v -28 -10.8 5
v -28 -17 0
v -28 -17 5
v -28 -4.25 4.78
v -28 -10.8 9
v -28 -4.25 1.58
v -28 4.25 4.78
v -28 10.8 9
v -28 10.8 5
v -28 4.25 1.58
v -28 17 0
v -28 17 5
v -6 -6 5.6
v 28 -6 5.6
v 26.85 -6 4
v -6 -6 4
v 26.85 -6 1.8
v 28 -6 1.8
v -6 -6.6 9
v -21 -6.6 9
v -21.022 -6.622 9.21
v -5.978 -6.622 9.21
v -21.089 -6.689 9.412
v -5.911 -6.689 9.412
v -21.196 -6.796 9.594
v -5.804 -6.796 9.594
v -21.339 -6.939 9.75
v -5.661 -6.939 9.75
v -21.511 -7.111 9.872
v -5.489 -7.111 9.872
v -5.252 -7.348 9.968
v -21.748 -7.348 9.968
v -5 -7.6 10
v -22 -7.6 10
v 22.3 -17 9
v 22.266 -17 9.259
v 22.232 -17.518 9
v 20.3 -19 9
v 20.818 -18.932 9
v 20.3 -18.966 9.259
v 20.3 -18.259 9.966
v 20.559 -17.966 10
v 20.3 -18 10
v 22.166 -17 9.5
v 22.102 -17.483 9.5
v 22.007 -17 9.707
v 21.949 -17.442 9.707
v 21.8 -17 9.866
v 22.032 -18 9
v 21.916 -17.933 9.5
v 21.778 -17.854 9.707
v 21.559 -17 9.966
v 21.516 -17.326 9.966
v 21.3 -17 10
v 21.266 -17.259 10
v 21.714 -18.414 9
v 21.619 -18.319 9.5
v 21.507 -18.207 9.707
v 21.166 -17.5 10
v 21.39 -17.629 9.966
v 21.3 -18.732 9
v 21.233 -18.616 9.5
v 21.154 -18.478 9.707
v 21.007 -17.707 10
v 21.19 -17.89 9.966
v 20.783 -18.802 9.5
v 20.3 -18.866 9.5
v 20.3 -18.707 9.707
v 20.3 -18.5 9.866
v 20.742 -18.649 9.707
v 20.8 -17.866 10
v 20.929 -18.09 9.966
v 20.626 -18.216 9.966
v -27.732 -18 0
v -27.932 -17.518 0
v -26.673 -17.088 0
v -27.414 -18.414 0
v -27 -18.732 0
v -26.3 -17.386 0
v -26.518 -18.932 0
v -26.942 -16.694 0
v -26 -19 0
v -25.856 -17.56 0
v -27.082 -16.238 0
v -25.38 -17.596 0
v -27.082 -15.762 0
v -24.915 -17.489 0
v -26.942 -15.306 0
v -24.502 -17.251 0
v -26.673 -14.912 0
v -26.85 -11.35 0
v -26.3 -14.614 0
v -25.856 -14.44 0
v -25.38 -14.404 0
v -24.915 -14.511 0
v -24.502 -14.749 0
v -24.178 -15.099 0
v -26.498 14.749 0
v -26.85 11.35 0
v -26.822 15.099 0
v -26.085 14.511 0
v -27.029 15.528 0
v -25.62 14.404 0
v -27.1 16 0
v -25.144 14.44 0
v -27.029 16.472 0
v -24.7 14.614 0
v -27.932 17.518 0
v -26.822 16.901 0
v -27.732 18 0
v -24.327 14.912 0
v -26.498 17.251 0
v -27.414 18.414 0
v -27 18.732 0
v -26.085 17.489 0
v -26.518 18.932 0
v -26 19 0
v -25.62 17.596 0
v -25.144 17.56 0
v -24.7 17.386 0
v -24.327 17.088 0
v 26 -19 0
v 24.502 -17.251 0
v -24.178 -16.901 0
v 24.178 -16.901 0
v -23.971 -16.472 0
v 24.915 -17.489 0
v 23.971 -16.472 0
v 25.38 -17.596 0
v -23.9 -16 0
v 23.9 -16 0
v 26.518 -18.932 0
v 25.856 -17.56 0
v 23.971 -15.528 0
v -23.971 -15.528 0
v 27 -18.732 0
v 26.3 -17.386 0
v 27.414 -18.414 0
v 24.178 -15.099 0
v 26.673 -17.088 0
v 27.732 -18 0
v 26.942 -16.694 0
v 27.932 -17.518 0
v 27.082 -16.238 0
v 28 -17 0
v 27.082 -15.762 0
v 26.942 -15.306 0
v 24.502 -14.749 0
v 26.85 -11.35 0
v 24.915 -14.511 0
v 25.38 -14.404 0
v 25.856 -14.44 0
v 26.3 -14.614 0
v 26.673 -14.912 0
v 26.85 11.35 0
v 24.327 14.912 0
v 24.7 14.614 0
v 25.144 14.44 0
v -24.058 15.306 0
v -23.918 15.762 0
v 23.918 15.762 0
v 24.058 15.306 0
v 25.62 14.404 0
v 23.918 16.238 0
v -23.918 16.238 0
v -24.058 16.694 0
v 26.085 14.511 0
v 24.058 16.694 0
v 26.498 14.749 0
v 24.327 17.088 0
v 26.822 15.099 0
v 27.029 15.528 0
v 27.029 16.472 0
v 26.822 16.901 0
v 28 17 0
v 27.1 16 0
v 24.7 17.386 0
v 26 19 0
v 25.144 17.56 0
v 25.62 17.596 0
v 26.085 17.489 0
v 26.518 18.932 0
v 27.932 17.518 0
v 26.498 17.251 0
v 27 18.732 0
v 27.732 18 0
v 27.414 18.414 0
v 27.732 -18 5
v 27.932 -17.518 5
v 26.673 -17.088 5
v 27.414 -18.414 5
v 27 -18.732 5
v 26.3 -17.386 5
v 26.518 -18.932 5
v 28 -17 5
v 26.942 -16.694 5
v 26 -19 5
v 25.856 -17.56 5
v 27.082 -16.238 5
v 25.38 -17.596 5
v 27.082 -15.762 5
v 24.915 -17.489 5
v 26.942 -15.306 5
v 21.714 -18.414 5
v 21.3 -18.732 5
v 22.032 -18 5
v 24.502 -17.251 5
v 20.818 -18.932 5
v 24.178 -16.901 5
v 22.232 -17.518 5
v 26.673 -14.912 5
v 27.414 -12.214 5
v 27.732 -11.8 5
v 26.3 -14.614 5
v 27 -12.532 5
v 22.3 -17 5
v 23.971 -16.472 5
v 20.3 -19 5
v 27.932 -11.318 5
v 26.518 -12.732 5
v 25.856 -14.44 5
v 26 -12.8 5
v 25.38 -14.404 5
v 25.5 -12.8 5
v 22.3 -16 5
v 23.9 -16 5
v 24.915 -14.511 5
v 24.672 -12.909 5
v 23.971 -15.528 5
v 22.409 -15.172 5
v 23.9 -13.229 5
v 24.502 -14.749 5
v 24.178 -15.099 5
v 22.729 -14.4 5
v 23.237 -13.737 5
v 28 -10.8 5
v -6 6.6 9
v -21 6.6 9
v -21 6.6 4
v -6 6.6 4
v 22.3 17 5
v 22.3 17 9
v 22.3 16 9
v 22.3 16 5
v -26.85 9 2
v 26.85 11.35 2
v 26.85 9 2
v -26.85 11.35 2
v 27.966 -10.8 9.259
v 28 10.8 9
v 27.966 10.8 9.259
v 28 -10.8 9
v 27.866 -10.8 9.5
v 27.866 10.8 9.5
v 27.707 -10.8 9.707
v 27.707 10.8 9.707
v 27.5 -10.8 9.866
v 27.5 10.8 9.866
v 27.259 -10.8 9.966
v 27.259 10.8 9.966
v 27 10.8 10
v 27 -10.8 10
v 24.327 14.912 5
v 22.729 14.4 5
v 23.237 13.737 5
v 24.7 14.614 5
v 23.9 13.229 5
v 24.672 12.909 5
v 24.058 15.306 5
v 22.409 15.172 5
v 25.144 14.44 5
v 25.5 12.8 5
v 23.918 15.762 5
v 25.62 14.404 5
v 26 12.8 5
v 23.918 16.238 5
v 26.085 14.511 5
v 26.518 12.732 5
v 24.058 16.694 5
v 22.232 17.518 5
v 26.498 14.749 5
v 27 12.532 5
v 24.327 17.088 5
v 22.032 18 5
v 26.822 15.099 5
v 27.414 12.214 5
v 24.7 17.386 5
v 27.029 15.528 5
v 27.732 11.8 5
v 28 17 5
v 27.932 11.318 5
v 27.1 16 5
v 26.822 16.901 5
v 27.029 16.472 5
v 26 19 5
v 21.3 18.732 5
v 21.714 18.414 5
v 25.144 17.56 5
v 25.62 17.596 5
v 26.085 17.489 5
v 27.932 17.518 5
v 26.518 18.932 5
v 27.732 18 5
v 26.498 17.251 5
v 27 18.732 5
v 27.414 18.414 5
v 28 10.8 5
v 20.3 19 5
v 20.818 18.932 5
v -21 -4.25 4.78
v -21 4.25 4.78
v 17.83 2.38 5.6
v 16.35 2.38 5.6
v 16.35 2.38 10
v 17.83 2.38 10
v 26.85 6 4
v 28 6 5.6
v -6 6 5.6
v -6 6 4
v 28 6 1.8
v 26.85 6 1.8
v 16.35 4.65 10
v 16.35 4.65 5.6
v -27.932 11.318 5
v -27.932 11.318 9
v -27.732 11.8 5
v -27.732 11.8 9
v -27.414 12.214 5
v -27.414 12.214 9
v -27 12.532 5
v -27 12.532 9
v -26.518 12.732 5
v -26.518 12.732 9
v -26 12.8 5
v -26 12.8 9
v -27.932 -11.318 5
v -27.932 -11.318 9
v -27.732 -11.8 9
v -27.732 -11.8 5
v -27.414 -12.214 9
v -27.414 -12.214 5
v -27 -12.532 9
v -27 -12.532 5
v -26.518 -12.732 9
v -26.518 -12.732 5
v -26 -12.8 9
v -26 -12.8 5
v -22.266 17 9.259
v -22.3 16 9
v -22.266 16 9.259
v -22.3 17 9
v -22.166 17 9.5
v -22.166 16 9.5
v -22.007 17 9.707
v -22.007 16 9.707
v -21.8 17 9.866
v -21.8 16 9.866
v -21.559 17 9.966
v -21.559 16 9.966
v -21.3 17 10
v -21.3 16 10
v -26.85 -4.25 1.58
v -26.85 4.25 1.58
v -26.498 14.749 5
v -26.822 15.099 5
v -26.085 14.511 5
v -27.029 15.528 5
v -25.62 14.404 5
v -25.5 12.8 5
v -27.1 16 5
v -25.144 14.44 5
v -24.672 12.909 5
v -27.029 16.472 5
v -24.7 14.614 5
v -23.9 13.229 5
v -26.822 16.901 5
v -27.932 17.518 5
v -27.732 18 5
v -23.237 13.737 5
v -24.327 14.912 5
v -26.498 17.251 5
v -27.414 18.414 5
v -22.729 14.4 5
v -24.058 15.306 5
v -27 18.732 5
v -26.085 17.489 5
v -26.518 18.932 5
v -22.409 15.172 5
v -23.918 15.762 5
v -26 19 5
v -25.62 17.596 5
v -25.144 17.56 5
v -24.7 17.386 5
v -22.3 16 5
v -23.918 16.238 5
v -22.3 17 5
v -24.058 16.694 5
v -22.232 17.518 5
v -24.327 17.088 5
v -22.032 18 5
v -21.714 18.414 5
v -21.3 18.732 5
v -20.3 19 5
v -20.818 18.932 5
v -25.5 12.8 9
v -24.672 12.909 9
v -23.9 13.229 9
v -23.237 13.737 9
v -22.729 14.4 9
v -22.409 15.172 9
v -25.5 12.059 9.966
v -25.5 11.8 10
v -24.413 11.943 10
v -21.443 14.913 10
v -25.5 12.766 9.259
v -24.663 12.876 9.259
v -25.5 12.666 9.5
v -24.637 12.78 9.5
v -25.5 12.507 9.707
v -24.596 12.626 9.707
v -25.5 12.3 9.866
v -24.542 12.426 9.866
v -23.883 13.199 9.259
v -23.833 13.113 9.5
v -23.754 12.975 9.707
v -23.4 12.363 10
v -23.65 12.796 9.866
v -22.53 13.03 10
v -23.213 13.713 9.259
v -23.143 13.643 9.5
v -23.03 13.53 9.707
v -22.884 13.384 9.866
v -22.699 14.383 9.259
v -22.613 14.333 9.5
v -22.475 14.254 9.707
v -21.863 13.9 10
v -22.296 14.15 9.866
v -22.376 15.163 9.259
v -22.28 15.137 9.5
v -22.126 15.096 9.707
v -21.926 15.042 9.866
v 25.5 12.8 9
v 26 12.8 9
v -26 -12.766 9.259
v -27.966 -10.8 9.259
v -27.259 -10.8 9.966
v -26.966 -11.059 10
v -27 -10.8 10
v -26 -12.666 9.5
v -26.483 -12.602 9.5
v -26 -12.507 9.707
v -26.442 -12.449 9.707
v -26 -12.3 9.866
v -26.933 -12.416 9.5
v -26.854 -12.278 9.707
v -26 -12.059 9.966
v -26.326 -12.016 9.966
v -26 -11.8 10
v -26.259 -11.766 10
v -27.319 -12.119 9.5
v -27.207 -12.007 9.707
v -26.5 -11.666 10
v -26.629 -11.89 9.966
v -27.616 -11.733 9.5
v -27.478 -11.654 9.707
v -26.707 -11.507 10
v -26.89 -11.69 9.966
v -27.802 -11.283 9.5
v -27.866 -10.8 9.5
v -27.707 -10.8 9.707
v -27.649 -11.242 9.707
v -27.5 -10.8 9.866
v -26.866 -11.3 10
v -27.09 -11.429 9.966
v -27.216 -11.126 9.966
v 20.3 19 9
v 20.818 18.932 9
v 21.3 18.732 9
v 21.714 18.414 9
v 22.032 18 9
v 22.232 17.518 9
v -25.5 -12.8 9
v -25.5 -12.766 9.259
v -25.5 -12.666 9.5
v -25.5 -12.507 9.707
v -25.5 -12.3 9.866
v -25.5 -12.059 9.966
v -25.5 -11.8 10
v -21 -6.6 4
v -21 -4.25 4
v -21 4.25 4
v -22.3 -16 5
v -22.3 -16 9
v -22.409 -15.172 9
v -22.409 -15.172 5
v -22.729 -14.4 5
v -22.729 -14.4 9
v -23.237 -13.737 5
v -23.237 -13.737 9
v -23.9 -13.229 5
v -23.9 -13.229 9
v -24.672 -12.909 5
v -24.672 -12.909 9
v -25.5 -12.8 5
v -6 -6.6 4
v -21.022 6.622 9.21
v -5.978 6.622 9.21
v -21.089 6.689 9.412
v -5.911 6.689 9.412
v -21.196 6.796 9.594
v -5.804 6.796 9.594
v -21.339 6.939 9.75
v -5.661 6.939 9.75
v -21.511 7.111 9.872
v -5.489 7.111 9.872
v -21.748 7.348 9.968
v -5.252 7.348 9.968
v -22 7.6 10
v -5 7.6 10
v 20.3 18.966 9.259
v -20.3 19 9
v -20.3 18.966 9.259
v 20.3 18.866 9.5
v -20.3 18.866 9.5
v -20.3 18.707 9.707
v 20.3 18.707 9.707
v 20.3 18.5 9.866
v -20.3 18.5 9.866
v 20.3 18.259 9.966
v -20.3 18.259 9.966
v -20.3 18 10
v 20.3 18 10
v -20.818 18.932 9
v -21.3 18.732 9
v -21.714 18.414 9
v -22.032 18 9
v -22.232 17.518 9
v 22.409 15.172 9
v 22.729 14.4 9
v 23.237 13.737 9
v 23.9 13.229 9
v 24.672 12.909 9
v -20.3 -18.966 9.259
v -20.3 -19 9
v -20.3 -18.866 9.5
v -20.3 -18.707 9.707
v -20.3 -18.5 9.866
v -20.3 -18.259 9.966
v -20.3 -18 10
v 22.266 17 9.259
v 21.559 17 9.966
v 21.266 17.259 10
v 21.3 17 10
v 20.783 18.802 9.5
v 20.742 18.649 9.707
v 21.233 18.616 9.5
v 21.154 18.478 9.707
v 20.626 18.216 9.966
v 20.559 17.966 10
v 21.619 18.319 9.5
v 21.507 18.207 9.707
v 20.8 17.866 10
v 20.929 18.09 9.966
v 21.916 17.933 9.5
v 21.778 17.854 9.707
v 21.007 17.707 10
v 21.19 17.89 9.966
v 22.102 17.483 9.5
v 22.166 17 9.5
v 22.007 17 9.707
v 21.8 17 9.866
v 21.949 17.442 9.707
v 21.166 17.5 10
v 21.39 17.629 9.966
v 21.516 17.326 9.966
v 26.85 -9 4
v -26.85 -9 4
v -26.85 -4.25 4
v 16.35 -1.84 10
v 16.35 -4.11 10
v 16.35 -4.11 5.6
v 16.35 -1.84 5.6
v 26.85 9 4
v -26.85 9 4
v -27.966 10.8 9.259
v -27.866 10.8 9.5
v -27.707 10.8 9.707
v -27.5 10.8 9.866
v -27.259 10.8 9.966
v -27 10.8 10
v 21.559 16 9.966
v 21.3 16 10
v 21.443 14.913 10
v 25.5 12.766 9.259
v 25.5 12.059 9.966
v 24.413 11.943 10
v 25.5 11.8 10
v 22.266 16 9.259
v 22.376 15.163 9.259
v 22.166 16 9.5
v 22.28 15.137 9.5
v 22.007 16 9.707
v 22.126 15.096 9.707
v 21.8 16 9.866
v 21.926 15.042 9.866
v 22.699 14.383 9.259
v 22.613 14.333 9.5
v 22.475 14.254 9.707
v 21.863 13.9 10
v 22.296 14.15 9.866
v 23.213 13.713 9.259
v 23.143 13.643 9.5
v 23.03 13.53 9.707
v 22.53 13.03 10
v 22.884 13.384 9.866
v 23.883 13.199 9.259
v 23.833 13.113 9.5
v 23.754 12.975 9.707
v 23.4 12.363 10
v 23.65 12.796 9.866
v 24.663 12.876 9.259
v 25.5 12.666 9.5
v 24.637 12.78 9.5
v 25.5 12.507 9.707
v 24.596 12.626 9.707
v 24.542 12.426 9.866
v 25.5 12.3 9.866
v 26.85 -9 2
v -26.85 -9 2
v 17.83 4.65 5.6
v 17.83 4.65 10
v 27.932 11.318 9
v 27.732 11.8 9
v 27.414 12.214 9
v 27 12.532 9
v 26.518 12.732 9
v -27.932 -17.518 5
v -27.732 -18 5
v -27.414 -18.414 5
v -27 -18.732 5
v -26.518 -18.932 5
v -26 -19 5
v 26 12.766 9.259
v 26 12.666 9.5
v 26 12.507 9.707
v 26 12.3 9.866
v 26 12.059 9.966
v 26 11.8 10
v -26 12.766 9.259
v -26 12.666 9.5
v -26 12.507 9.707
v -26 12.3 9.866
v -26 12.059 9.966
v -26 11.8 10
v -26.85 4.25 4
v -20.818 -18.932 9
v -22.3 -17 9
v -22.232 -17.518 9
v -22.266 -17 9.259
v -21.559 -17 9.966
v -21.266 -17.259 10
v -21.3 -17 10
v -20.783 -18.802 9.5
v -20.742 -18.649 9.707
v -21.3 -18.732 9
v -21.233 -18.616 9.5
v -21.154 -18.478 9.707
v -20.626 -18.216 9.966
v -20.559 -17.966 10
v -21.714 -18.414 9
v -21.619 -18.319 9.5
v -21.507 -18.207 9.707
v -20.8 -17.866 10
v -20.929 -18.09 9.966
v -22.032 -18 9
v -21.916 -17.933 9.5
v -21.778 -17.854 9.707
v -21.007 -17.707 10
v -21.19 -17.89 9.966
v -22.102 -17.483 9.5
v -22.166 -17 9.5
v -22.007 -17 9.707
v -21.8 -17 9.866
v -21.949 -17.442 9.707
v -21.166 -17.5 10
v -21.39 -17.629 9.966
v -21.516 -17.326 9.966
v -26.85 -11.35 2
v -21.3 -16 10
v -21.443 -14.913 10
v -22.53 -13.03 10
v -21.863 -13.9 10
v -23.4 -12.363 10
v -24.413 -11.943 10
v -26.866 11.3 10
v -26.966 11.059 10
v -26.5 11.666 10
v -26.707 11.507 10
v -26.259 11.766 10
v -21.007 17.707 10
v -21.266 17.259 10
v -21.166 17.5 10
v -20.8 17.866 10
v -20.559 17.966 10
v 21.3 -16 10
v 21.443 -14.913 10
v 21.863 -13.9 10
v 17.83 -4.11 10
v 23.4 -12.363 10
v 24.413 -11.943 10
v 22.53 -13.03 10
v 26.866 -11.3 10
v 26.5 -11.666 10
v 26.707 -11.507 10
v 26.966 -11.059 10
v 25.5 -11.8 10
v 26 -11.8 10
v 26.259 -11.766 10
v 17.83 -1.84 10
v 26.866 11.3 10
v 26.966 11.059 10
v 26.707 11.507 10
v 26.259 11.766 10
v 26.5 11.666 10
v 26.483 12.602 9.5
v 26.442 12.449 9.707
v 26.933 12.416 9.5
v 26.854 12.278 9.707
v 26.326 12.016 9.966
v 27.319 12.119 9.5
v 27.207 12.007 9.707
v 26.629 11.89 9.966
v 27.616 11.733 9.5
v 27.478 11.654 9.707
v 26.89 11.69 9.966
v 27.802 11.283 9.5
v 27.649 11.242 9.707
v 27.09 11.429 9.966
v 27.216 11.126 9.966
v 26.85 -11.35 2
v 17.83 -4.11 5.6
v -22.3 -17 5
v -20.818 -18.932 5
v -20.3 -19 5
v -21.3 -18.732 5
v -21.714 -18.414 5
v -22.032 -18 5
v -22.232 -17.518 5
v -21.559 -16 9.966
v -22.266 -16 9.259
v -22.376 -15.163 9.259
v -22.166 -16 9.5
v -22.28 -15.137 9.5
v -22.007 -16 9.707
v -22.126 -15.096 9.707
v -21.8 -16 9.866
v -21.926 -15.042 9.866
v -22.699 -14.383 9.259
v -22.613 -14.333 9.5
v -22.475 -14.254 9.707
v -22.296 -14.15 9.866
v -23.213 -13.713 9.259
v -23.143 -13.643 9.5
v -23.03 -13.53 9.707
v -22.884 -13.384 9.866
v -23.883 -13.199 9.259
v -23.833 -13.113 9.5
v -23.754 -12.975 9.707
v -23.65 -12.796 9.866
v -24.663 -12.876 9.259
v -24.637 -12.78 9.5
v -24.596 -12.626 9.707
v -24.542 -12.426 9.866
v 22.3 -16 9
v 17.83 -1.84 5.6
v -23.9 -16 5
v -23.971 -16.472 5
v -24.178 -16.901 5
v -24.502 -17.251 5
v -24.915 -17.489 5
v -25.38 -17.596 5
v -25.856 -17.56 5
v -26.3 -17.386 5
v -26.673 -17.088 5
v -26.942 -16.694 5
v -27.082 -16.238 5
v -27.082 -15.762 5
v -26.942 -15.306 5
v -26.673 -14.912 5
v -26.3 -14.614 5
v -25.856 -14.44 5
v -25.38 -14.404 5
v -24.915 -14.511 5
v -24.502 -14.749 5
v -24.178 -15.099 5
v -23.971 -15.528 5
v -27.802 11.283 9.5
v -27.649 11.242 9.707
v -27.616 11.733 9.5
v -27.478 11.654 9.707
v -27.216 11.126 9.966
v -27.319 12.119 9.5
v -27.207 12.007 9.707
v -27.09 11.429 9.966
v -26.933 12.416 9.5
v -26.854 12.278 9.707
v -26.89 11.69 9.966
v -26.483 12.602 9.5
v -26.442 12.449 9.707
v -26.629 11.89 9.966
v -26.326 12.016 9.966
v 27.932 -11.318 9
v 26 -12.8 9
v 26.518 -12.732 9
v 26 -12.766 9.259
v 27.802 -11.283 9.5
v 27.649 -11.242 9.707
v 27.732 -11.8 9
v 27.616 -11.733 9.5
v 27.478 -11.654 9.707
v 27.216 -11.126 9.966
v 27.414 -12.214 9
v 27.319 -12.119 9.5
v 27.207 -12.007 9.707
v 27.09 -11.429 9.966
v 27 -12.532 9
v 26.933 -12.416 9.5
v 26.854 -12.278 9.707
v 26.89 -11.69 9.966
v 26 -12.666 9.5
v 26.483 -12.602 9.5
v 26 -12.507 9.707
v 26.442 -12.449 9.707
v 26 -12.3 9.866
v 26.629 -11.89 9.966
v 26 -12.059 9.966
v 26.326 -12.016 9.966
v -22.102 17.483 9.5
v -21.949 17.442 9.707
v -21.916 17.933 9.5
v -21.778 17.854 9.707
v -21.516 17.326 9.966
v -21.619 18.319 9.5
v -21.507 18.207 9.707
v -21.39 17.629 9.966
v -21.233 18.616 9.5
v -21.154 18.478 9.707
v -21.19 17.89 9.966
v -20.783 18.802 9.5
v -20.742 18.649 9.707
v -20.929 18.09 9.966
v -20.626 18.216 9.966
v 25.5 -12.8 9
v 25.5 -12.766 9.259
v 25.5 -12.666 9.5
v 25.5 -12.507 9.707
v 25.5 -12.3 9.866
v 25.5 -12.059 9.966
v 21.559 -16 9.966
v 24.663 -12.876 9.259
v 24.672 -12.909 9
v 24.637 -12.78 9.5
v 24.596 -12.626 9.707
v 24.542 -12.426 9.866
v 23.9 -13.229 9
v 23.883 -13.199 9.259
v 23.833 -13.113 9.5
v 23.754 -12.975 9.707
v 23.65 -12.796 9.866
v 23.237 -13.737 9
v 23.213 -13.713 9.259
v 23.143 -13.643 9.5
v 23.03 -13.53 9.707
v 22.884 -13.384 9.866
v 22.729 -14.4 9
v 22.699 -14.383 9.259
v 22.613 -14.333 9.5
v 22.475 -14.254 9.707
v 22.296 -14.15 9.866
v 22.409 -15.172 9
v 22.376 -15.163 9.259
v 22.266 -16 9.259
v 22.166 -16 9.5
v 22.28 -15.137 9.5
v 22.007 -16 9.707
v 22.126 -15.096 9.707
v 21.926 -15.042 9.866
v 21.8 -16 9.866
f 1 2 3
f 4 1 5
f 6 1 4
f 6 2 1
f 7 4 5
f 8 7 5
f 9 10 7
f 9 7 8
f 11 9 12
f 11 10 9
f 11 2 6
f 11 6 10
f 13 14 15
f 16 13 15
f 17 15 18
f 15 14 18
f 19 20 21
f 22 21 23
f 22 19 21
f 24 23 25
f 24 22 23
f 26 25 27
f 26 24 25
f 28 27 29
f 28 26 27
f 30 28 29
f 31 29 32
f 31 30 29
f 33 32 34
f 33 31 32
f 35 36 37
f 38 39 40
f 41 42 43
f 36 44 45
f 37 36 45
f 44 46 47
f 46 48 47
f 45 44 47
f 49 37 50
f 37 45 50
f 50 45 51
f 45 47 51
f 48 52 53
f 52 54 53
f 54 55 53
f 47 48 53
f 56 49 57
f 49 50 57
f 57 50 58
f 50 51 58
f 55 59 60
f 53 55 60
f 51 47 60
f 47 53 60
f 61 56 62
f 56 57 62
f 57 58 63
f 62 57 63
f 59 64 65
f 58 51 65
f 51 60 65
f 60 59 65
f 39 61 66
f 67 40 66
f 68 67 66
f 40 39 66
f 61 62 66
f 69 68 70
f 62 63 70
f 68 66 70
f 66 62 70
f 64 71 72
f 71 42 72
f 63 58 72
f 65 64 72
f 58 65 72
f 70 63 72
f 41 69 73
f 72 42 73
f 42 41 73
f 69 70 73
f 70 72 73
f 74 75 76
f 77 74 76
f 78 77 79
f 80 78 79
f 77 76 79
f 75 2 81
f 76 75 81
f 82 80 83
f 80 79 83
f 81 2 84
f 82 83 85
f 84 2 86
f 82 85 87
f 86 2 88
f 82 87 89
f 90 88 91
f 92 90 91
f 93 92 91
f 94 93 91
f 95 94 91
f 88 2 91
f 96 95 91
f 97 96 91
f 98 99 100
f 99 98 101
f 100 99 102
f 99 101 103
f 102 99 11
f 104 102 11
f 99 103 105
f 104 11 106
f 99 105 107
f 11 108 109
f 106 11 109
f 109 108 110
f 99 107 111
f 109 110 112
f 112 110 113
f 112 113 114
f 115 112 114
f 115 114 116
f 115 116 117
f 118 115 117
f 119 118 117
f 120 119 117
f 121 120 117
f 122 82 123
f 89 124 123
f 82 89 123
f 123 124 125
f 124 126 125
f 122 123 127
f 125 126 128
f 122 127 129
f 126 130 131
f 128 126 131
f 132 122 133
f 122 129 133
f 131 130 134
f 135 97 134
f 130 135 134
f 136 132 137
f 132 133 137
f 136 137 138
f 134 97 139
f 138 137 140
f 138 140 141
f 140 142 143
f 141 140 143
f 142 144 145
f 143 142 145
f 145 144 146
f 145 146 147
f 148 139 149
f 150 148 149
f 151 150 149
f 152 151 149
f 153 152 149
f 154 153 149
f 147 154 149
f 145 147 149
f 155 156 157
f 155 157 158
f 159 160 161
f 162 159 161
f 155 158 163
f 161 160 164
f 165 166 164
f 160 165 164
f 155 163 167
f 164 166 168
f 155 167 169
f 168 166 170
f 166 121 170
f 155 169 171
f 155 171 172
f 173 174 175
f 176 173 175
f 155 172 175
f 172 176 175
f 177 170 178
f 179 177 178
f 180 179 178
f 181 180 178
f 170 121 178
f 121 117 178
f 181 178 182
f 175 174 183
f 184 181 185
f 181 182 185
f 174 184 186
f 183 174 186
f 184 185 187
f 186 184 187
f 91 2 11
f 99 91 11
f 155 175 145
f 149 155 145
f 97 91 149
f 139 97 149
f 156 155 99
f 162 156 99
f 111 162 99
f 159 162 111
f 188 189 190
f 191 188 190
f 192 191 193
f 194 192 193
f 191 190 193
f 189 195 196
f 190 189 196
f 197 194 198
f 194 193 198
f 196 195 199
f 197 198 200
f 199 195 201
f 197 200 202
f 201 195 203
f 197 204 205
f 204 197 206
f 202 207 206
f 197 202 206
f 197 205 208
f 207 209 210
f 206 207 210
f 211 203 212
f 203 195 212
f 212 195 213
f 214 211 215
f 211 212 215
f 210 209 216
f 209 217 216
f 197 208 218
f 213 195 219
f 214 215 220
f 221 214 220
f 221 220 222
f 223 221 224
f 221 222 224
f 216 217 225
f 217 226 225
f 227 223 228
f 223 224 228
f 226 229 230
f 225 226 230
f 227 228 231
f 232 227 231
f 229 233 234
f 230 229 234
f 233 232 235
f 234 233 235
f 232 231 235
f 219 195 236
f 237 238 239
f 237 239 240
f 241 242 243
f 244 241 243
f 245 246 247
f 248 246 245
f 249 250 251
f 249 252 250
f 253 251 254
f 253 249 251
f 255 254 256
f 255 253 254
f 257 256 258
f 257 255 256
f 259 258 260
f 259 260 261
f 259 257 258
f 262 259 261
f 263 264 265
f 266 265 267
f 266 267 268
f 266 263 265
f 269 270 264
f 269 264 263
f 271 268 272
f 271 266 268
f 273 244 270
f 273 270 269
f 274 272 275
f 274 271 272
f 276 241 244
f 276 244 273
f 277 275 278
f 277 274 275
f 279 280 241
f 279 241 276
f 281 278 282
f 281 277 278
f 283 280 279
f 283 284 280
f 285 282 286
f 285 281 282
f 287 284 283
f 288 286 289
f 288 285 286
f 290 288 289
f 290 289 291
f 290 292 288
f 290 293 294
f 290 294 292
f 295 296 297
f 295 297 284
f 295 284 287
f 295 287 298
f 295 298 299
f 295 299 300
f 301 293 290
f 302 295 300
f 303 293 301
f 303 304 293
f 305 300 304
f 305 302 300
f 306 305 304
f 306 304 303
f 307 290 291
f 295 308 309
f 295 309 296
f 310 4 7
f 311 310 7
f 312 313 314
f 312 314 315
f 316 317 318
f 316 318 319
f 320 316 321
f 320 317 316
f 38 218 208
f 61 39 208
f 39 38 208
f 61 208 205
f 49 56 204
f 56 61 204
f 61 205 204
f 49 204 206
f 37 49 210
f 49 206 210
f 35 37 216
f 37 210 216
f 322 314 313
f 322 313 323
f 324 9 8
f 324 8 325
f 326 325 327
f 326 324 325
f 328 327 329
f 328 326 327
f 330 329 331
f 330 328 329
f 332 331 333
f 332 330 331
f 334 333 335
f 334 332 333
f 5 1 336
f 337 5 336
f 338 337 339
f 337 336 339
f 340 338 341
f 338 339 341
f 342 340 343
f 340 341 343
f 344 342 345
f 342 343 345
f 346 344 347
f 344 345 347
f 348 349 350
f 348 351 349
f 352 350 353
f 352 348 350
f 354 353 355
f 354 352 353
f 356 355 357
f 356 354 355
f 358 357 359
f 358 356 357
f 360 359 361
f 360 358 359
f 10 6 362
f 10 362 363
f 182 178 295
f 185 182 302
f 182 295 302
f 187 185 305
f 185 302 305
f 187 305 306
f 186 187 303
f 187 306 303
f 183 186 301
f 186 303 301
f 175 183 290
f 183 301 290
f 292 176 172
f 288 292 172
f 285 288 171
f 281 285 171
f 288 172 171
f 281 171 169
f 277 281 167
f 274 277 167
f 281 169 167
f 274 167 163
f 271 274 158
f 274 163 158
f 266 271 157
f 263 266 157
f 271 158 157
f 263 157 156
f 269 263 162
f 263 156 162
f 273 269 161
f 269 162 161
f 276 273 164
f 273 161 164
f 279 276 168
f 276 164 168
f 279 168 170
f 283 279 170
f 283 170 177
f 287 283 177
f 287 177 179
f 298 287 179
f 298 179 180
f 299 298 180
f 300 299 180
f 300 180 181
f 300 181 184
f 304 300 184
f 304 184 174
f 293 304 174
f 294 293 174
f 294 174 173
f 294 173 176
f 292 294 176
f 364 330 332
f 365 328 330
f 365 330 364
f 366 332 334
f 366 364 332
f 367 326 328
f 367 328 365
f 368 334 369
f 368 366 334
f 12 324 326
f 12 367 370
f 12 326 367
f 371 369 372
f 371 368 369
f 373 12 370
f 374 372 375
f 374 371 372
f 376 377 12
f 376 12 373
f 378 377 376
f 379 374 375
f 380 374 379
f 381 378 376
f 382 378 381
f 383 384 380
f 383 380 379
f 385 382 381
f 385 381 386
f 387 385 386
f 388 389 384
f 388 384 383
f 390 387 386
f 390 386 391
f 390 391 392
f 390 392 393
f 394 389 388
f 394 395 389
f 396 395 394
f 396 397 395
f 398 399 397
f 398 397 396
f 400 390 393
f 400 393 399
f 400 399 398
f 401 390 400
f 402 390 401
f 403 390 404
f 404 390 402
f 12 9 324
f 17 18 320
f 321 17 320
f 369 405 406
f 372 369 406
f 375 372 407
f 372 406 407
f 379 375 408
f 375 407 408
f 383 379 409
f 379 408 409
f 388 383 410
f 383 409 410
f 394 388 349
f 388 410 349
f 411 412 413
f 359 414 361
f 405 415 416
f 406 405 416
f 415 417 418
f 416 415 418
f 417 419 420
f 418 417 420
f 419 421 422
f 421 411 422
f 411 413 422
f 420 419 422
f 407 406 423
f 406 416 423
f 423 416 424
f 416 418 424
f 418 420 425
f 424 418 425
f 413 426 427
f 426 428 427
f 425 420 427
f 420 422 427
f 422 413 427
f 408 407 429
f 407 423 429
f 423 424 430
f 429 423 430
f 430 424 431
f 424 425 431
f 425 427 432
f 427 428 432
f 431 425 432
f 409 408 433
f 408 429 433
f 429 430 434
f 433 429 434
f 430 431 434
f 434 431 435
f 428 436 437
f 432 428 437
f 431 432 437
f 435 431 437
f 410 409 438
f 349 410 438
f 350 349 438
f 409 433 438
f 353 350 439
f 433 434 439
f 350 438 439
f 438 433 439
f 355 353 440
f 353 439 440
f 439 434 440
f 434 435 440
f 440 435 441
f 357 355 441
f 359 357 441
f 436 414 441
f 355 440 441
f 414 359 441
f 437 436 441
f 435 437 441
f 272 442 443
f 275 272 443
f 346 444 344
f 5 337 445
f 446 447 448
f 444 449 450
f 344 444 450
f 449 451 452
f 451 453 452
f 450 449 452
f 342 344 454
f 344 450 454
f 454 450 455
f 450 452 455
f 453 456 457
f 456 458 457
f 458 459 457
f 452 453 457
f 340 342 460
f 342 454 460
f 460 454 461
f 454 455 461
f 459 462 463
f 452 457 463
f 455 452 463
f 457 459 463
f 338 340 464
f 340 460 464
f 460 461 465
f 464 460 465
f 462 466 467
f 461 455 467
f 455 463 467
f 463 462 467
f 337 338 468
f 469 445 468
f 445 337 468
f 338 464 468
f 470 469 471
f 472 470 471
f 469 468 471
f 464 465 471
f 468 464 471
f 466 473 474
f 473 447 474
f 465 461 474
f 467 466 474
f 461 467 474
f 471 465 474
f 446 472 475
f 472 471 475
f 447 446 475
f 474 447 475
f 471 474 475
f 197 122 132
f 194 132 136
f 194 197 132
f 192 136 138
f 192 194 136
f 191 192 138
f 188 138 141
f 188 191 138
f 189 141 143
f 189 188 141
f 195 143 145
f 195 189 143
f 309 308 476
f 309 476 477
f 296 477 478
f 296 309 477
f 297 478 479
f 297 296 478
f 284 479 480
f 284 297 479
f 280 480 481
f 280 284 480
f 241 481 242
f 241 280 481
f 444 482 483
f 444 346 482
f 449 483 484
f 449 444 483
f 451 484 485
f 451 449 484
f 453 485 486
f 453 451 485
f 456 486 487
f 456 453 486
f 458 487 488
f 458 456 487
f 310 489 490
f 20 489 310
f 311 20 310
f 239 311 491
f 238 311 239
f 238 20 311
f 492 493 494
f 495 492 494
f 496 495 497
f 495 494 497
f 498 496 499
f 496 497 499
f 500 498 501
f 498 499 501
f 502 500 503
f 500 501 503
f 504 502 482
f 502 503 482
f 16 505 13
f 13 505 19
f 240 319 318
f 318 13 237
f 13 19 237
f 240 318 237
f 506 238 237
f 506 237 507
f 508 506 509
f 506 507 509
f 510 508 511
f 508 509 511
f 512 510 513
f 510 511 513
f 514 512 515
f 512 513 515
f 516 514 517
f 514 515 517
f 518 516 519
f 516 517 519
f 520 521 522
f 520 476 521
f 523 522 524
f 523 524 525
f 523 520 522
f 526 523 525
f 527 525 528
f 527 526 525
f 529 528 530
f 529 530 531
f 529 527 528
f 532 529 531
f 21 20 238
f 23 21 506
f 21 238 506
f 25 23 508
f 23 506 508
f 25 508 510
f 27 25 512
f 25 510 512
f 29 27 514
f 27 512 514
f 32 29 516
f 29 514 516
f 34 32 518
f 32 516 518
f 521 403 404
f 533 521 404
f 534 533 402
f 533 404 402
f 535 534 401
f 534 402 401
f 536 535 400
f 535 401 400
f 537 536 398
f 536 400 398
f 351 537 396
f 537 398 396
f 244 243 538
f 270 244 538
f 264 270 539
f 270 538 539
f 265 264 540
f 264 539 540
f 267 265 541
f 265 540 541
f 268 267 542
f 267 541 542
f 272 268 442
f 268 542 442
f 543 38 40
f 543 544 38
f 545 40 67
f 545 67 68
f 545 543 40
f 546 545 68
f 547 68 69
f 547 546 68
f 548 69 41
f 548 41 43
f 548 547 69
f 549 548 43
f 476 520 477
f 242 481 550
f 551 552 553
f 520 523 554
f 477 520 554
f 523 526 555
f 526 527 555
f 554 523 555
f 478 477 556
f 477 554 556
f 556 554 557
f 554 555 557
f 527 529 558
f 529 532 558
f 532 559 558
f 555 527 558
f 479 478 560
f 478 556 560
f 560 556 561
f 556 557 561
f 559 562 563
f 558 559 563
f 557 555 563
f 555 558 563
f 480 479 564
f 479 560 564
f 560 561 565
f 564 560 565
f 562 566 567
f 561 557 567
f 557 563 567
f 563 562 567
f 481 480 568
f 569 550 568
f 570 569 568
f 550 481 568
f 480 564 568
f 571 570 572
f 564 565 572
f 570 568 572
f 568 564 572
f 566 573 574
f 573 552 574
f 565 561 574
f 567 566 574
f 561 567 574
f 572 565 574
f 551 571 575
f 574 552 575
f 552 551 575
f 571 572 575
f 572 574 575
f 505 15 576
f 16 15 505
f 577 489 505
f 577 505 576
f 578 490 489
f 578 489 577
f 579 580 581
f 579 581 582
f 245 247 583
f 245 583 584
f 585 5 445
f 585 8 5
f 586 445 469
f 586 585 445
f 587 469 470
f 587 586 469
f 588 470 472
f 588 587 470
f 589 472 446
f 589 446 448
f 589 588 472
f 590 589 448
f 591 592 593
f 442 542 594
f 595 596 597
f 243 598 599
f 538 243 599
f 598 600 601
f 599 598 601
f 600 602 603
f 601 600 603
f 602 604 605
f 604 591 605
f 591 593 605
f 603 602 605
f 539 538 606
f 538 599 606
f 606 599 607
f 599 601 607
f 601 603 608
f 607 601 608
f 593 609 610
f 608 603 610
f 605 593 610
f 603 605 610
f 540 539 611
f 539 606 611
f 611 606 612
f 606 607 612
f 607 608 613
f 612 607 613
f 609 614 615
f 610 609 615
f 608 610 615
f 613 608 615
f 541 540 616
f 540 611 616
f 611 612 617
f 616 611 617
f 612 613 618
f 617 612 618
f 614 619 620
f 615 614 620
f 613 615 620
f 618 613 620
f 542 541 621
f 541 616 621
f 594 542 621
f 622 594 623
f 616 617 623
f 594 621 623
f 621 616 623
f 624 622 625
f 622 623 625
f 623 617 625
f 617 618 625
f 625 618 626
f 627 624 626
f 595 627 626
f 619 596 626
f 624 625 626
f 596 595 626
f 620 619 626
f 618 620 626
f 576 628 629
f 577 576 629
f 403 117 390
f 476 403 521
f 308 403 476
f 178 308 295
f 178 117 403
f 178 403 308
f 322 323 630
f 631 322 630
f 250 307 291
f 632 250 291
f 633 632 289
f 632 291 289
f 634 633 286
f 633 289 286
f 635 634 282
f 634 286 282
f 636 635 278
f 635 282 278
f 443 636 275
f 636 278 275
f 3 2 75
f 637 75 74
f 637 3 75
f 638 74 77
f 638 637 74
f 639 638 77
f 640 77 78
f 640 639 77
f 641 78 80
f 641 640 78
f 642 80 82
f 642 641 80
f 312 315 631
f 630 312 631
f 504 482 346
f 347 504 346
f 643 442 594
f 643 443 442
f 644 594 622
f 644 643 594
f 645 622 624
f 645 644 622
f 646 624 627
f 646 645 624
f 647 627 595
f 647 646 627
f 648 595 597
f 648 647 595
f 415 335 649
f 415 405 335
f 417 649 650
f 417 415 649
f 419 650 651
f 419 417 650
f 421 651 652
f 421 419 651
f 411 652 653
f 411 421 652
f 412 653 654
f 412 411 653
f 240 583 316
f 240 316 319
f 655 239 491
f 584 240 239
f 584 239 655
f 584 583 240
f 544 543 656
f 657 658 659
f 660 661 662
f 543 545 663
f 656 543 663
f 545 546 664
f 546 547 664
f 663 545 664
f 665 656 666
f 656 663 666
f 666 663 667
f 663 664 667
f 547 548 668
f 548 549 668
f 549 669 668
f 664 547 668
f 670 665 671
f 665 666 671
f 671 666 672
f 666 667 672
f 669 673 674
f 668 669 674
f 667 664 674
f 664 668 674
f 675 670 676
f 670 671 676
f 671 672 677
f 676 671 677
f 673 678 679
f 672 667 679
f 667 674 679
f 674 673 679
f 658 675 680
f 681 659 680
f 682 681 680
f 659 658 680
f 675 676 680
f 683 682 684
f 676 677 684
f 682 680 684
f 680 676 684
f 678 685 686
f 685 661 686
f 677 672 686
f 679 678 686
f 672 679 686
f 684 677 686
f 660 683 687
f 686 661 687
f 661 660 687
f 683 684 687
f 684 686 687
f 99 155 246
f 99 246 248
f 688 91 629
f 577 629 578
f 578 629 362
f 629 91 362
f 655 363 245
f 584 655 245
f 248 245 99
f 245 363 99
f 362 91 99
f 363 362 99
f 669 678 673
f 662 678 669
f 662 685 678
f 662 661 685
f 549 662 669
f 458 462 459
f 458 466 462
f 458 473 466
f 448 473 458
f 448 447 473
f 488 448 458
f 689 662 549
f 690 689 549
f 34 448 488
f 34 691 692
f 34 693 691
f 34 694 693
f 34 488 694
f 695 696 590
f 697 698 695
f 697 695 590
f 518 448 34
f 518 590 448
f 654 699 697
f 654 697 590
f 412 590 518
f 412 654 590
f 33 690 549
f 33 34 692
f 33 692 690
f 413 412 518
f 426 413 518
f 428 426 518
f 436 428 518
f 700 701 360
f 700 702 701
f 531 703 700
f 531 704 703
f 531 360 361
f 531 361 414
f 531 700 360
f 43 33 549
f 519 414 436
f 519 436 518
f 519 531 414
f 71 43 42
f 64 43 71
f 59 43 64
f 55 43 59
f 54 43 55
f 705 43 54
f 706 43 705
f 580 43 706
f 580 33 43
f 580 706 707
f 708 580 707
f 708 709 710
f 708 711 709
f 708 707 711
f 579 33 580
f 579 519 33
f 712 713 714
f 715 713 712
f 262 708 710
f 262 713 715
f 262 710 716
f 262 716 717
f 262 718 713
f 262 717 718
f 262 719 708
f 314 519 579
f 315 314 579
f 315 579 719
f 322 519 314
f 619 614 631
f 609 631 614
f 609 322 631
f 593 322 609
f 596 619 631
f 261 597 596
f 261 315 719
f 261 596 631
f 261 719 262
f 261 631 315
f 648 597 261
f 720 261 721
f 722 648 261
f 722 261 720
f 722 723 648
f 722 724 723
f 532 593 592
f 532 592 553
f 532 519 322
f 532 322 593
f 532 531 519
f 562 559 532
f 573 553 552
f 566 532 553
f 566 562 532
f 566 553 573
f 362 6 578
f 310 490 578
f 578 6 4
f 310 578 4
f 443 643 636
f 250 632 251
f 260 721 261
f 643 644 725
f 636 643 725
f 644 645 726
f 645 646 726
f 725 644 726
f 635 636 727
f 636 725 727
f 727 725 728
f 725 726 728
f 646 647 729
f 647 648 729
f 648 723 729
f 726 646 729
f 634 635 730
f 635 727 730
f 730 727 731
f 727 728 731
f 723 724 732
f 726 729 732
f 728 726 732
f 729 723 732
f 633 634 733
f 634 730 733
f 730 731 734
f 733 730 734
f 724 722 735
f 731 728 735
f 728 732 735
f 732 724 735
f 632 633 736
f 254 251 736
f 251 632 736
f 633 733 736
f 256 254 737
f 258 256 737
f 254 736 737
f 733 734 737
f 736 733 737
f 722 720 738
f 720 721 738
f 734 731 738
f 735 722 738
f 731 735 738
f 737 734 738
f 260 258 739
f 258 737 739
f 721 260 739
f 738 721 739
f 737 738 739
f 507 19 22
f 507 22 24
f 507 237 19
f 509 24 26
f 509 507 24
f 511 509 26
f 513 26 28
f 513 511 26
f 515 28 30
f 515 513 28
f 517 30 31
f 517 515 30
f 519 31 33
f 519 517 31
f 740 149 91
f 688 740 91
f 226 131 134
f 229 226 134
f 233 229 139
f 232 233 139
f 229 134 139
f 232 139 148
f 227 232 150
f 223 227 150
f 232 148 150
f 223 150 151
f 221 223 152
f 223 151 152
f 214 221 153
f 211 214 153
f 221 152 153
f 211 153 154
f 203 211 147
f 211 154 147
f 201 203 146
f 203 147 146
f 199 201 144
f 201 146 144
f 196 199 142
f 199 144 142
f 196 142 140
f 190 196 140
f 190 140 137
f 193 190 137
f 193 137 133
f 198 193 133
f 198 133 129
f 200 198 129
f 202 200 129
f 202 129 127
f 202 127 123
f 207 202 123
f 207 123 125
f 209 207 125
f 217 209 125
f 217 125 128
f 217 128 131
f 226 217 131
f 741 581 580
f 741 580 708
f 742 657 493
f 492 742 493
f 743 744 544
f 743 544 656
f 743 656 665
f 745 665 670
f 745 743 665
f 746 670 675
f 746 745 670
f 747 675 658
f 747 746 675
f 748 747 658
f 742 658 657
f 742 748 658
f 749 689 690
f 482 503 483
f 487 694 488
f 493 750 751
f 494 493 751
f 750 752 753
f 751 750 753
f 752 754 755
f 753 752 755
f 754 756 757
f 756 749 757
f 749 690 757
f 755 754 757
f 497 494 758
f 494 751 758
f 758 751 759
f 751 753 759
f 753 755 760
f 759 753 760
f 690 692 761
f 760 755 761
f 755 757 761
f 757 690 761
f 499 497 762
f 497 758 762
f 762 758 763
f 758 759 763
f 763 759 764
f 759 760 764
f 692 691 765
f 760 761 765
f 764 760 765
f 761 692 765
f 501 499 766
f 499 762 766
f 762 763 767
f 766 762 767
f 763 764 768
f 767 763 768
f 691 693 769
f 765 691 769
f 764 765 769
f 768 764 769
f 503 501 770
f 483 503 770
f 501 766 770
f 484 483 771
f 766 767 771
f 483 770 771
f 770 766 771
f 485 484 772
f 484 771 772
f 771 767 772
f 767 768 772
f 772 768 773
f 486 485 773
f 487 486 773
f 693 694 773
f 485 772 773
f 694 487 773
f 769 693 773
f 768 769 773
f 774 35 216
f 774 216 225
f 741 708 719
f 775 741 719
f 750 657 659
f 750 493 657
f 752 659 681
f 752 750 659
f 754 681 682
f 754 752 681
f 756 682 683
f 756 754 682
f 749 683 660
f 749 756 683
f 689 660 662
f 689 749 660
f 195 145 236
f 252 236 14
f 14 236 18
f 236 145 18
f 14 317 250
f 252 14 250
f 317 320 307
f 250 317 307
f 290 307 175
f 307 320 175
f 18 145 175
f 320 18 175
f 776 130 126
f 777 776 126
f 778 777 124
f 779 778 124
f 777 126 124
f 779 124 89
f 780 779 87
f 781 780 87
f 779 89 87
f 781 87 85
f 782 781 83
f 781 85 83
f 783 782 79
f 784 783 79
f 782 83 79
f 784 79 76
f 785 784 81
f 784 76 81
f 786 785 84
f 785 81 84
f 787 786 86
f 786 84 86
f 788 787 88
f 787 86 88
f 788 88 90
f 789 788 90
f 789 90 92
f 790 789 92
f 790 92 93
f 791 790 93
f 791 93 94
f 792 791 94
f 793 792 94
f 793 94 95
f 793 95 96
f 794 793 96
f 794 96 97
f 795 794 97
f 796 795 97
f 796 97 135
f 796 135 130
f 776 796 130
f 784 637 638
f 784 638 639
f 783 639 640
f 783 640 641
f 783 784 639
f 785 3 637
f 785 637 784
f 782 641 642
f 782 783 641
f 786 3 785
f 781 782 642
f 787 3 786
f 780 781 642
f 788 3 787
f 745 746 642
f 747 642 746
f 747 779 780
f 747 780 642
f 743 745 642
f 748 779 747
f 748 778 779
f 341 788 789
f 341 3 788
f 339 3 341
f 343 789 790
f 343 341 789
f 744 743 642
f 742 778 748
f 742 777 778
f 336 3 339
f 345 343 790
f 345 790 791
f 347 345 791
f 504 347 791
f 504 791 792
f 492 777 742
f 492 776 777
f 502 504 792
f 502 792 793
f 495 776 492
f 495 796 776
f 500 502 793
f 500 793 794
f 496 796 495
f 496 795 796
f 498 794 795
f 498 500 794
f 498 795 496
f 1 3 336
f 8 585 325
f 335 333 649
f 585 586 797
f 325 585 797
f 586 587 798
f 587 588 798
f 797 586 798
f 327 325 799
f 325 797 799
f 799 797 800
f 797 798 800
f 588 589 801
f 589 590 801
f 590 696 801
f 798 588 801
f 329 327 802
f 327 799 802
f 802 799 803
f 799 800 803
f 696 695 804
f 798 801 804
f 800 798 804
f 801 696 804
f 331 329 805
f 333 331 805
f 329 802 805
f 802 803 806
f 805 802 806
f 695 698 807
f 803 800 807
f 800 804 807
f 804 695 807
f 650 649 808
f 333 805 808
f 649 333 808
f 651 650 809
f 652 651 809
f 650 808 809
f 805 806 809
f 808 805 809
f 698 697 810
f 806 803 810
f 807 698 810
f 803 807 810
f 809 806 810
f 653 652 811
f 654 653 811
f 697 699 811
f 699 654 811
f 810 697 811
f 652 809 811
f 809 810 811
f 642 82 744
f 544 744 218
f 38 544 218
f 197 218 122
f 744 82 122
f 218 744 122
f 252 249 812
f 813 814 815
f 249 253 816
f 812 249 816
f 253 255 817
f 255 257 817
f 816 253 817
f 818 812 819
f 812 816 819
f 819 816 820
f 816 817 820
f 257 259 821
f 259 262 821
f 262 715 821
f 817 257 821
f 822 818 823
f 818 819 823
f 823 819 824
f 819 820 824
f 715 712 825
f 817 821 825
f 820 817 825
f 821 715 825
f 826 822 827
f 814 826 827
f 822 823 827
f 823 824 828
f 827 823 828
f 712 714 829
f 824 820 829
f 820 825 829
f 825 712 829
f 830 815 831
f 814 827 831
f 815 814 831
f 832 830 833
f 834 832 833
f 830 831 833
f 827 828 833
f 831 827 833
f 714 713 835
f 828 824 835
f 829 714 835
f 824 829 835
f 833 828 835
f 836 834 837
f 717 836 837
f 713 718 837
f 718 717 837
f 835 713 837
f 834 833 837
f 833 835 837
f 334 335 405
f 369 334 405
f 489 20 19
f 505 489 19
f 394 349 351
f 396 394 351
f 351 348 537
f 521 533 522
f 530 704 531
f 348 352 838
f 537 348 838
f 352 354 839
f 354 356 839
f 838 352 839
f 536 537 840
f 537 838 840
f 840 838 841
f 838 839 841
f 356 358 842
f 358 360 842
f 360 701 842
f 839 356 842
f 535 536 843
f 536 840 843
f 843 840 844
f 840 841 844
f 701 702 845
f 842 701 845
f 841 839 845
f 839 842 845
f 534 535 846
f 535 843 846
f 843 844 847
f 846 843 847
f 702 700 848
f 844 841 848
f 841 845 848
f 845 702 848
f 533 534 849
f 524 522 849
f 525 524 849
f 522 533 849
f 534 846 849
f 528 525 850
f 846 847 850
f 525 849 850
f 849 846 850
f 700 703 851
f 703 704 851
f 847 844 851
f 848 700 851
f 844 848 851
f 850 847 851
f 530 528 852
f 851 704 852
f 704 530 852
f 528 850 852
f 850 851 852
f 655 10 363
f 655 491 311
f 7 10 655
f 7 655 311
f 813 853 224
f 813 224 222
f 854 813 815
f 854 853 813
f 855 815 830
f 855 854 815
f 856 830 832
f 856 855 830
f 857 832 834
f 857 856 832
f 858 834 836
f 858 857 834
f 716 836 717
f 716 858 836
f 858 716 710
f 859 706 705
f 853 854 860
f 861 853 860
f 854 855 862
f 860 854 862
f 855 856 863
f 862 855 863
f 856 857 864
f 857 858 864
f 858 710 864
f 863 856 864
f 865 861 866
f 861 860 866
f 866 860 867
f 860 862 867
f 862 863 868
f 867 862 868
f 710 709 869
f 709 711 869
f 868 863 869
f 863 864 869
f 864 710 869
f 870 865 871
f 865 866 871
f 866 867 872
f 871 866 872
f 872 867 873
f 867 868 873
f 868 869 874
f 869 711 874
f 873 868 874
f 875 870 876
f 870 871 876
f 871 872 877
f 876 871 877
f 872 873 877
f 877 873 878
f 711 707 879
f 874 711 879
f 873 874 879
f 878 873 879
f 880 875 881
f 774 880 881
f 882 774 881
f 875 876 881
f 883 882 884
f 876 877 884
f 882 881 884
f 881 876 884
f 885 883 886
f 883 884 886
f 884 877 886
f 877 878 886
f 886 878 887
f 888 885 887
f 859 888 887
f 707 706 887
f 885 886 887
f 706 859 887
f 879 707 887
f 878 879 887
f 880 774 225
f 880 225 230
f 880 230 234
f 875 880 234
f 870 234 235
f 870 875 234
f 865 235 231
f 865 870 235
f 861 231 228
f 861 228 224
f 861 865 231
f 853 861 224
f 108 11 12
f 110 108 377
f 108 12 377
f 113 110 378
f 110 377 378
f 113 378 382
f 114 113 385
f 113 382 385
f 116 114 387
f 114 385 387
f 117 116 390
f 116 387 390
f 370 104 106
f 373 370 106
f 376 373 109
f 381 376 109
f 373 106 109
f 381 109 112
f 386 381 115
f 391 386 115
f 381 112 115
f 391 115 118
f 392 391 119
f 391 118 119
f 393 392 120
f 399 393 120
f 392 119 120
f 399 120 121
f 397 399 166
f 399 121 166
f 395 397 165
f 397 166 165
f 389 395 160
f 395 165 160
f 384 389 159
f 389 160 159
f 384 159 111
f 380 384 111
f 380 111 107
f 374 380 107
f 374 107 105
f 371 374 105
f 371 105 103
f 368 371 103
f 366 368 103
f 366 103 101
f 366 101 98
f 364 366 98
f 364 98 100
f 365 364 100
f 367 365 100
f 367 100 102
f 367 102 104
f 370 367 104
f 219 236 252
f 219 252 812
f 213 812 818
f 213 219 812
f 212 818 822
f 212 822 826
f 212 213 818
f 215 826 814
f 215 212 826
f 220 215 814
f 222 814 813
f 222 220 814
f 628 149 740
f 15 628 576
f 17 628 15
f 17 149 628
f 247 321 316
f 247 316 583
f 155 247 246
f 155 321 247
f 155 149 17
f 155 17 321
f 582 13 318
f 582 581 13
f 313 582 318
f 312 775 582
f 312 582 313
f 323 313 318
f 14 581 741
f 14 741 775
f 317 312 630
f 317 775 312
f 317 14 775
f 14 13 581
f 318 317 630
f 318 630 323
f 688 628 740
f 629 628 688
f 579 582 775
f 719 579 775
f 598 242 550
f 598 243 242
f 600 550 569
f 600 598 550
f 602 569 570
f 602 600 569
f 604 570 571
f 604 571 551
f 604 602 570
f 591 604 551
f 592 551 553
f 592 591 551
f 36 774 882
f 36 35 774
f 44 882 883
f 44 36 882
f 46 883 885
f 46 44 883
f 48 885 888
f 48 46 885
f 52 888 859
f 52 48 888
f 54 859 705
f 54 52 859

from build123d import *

# Parameters (mm, degrees)
SKETCH_1_W          = 56
SKETCH_1_H          = 38
EXTRUDE_1_DEPTH     = 10
SKETCH_2_W          = 15
SKETCH_2_H          = 13.2
SKETCH_2_W_2        = 1.48
SKETCH_2_H_2        = 2.27
CUT_EXTRUDE_1_DEPTH = 8
SKETCH_3_W          = 53.7
SKETCH_3_H          = 22.7
CUT_EXTRUDE_2_DEPTH = 2
CUT_EXTRUDE_4_REACH = 61.975
SKETCH_5_W          = 3.2
SKETCH_5_H          = 8.5
CUT_EXTRUDE_5_REACH = 61.975
SKETCH_6_W          = 3.8
SKETCH_6_H          = 12
SKETCH_7_R          = 1.6
CUT_EXTRUDE_6_DEPTH = 36.284557529
FILLET_1_R          = 2
CUT_EXTRUDE_7_DEPTH = 5
FILLET_3_R          = 2
FILLET_4_R          = 1
SKETCH_10_W         = 53.7
SKETCH_10_H         = 18
CUT_EXTRUDE_9_DEPTH = 4


with BuildPart() as part:
    # 草图1 → 凸台-拉伸1 (new body)
    with BuildSketch(Plane.XY):
        Rectangle(SKETCH_1_W, SKETCH_1_H)
    extrude(amount=EXTRUDE_1_DEPTH)

    # 草图2 → 切除-拉伸1 (cut)
    with BuildSketch(Plane.XY.offset(10)):
        with Locations((-13.5, 0)):
            Rectangle(SKETCH_2_W, SKETCH_2_H)
        with Locations((17.09, 3.515)):
            Rectangle(SKETCH_2_W_2, SKETCH_2_H_2)
        with Locations((17.09, -2.975)):
            Rectangle(SKETCH_2_W_2, SKETCH_2_H_2)
    extrude(amount=-CUT_EXTRUDE_1_DEPTH, mode=Mode.SUBTRACT)

    # 草图3 → 切除-拉伸2 (cut)
    with BuildSketch(Plane(origin=(0, 0, 0), x_dir=(-1, 0, 0), z_dir=(0, 0, -1))):
        Rectangle(SKETCH_3_W, SKETCH_3_H)
    extrude(amount=-CUT_EXTRUDE_2_DEPTH, mode=Mode.SUBTRACT)

    # 草图5 → 切除-拉伸4 (cut, up to next)
    with BuildSketch(Plane.ZY.offset(28), mode=Mode.PRIVATE) as cut_extrude_4_sk1:
        with Locations((3.18, 0)):
            Rectangle(SKETCH_5_W, SKETCH_5_H)
    cut_extrude_4_tool1 = extrude(cut_extrude_4_sk1.sketch, amount=-CUT_EXTRUDE_4_REACH, mode=Mode.PRIVATE) & part.part
    add(cut_extrude_4_tool1.solids().sort_by_distance((-28, 0, 3.18))[0], mode=Mode.SUBTRACT)

    # 草图6 → 切除-拉伸5 (cut, up to next)
    with BuildSketch(Plane(origin=(28, 0, 0), x_dir=(0, 0, -1), z_dir=(1, 0, 0)), mode=Mode.PRIVATE) as cut_extrude_5_sk1:
        with Locations((-3.7, 0)):
            Rectangle(SKETCH_6_W, SKETCH_6_H)
    cut_extrude_5_tool1 = extrude(cut_extrude_5_sk1.sketch, amount=-CUT_EXTRUDE_5_REACH, mode=Mode.PRIVATE) & part.part
    add(cut_extrude_5_tool1.solids().sort_by_distance((28, 0, 3.7))[0], mode=Mode.SUBTRACT)

    # 草图7 → 切除-拉伸6 (cut, through all)
    with BuildSketch(Plane(origin=(0, 0, 0), x_dir=(-1, 0, 0), z_dir=(0, 0, -1))):
        with Locations((25.5, 16)):
            Circle(SKETCH_7_R)
        with Locations(Location((25.5, -16, 0), (0, 0, 180))):
            Circle(SKETCH_7_R)
        with Locations((-25.5, -16)):
            Circle(SKETCH_7_R)
        with Locations(Location((-25.5, 16, 0), (0, 0, 180))):
            Circle(SKETCH_7_R)
    extrude(amount=-CUT_EXTRUDE_6_DEPTH, mode=Mode.SUBTRACT)

    # 圆角1
    fillet_1_edges = [part.edges().sort_by_distance(p)[0] for p in [
        (28, -19, 5),
        (-28, -19, 5),
        (-28, 19, 5),
        (28, 19, 5),
    ]]
    fillet(fillet_1_edges, radius=FILLET_1_R)

    # 草图8 → 切除-拉伸7 (cut)
    with BuildSketch(Plane.XY.offset(10)):
        with BuildLine():
            Line((-22.3, 16), (-22.3, 19))
            Line((-22.3, 19), (-26, 19))
            ThreePointArc((-26, 19), (-27.414213562, 18.414213562), (-28, 17))
            Line((-28, 17), (-28, 12.8))
            Line((-28, 12.8), (-25.5, 12.8))
            ThreePointArc((-25.5, 12.8), (-23.2372583, 13.7372583), (-22.3, 16))
        make_face()
        with BuildLine():
            Line((28, 12.8), (28, 17))
            ThreePointArc((28, 17), (27.414213562, 18.414213562), (26, 19))
            Line((26, 19), (22.3, 19))
            Line((22.3, 19), (22.3, 16))
            ThreePointArc((22.3, 16), (23.2372583, 13.7372583), (25.5, 12.8))
            Line((25.5, 12.8), (28, 12.8))
        make_face()
        with BuildLine():
            Line((-28, -12.8), (-28, -17))
            ThreePointArc((-28, -17), (-27.414213562, -18.414213562), (-26, -19))
            Line((-26, -19), (-22.3, -19))
            Line((-22.3, -19), (-22.3, -16))
            ThreePointArc((-22.3, -16), (-23.2372583, -13.7372583), (-25.5, -12.8))
            Line((-25.5, -12.8), (-28, -12.8))
        make_face()
        with BuildLine():
            Line((26, -19), (22.3, -19))
            Line((22.3, -19), (22.3, -16))
            ThreePointArc((22.3, -16), (23.2372583, -13.7372583), (25.5, -12.8))
            Line((25.5, -12.8), (28, -12.8))
            Line((28, -12.8), (28, -17))
            ThreePointArc((28, -17), (27.414213562, -18.414213562), (26, -19))
        make_face()
    extrude(amount=-CUT_EXTRUDE_7_DEPTH, mode=Mode.SUBTRACT)

    # 圆角3
    fillet_3_edges = [part.edges().sort_by_distance(p)[0] for p in [
        (28, 12.8, 7.5),
        (22.3, 19, 7.5),
        (-28, -12.8, 7.5),
        (-22.3, -19, 7.5),
        (22.3, -19, 7.5),
        (28, -12.8, 7.5),
        (-28, 12.8, 7.5),
        (-22.3, 19, 7.5),
    ]]
    fillet(fillet_3_edges, radius=FILLET_3_R)

    # 圆角4
    fillet_4_edges = [part.edges().sort_by_distance(p)[0] for p in [
        (23.2372583, 13.7372583, 10),
        (25.75, 12.8, 10),
        (-23.2372583, -13.7372583, 10),
        (-25.75, -12.8, 10),
        (-6, 0, 10),
        (23.2372583, -13.7372583, 10),
        (-13.5, 6.6, 10),
        (22.3, -16.5, 10),
        (-21, 0, 10),
        (-13.5, -6.6, 10),
        (-23.2372583, 13.7372583, 10),
        (-22.3, 16.5, 10),
        (0, -19, 10),
        (28, 0, 10),
        (22.3, 16.5, 10),
        (0, 19, 10),
        (-25.75, 12.8, 10),
        (-28, 0, 10),
        (-22.3, -16.5, 10),
        (25.75, -12.8, 10),
        (-27.414213562, -12.214213562, 10),
        (-21.714213562, -18.414213562, 10),
        (-27.414213562, 12.214213562, 10),
        (-21.714213562, 18.414213562, 10),
        (27.414213562, 12.214213562, 10),
        (21.714213562, 18.414213562, 10),
        (27.414213562, -12.214213562, 10),
        (21.714213562, -18.414213562, 10),
    ]]
    fillet(fillet_4_edges, radius=FILLET_4_R)

    # 草图10 → 切除-拉伸9 (cut)
    with BuildSketch(Plane(origin=(0, 0, 0), x_dir=(-1, 0, 0), z_dir=(0, 0, -1))):
        Rectangle(SKETCH_10_W, SKETCH_10_H)
    extrude(amount=-CUT_EXTRUDE_9_DEPTH, mode=Mode.SUBTRACT)


solid = part.part
